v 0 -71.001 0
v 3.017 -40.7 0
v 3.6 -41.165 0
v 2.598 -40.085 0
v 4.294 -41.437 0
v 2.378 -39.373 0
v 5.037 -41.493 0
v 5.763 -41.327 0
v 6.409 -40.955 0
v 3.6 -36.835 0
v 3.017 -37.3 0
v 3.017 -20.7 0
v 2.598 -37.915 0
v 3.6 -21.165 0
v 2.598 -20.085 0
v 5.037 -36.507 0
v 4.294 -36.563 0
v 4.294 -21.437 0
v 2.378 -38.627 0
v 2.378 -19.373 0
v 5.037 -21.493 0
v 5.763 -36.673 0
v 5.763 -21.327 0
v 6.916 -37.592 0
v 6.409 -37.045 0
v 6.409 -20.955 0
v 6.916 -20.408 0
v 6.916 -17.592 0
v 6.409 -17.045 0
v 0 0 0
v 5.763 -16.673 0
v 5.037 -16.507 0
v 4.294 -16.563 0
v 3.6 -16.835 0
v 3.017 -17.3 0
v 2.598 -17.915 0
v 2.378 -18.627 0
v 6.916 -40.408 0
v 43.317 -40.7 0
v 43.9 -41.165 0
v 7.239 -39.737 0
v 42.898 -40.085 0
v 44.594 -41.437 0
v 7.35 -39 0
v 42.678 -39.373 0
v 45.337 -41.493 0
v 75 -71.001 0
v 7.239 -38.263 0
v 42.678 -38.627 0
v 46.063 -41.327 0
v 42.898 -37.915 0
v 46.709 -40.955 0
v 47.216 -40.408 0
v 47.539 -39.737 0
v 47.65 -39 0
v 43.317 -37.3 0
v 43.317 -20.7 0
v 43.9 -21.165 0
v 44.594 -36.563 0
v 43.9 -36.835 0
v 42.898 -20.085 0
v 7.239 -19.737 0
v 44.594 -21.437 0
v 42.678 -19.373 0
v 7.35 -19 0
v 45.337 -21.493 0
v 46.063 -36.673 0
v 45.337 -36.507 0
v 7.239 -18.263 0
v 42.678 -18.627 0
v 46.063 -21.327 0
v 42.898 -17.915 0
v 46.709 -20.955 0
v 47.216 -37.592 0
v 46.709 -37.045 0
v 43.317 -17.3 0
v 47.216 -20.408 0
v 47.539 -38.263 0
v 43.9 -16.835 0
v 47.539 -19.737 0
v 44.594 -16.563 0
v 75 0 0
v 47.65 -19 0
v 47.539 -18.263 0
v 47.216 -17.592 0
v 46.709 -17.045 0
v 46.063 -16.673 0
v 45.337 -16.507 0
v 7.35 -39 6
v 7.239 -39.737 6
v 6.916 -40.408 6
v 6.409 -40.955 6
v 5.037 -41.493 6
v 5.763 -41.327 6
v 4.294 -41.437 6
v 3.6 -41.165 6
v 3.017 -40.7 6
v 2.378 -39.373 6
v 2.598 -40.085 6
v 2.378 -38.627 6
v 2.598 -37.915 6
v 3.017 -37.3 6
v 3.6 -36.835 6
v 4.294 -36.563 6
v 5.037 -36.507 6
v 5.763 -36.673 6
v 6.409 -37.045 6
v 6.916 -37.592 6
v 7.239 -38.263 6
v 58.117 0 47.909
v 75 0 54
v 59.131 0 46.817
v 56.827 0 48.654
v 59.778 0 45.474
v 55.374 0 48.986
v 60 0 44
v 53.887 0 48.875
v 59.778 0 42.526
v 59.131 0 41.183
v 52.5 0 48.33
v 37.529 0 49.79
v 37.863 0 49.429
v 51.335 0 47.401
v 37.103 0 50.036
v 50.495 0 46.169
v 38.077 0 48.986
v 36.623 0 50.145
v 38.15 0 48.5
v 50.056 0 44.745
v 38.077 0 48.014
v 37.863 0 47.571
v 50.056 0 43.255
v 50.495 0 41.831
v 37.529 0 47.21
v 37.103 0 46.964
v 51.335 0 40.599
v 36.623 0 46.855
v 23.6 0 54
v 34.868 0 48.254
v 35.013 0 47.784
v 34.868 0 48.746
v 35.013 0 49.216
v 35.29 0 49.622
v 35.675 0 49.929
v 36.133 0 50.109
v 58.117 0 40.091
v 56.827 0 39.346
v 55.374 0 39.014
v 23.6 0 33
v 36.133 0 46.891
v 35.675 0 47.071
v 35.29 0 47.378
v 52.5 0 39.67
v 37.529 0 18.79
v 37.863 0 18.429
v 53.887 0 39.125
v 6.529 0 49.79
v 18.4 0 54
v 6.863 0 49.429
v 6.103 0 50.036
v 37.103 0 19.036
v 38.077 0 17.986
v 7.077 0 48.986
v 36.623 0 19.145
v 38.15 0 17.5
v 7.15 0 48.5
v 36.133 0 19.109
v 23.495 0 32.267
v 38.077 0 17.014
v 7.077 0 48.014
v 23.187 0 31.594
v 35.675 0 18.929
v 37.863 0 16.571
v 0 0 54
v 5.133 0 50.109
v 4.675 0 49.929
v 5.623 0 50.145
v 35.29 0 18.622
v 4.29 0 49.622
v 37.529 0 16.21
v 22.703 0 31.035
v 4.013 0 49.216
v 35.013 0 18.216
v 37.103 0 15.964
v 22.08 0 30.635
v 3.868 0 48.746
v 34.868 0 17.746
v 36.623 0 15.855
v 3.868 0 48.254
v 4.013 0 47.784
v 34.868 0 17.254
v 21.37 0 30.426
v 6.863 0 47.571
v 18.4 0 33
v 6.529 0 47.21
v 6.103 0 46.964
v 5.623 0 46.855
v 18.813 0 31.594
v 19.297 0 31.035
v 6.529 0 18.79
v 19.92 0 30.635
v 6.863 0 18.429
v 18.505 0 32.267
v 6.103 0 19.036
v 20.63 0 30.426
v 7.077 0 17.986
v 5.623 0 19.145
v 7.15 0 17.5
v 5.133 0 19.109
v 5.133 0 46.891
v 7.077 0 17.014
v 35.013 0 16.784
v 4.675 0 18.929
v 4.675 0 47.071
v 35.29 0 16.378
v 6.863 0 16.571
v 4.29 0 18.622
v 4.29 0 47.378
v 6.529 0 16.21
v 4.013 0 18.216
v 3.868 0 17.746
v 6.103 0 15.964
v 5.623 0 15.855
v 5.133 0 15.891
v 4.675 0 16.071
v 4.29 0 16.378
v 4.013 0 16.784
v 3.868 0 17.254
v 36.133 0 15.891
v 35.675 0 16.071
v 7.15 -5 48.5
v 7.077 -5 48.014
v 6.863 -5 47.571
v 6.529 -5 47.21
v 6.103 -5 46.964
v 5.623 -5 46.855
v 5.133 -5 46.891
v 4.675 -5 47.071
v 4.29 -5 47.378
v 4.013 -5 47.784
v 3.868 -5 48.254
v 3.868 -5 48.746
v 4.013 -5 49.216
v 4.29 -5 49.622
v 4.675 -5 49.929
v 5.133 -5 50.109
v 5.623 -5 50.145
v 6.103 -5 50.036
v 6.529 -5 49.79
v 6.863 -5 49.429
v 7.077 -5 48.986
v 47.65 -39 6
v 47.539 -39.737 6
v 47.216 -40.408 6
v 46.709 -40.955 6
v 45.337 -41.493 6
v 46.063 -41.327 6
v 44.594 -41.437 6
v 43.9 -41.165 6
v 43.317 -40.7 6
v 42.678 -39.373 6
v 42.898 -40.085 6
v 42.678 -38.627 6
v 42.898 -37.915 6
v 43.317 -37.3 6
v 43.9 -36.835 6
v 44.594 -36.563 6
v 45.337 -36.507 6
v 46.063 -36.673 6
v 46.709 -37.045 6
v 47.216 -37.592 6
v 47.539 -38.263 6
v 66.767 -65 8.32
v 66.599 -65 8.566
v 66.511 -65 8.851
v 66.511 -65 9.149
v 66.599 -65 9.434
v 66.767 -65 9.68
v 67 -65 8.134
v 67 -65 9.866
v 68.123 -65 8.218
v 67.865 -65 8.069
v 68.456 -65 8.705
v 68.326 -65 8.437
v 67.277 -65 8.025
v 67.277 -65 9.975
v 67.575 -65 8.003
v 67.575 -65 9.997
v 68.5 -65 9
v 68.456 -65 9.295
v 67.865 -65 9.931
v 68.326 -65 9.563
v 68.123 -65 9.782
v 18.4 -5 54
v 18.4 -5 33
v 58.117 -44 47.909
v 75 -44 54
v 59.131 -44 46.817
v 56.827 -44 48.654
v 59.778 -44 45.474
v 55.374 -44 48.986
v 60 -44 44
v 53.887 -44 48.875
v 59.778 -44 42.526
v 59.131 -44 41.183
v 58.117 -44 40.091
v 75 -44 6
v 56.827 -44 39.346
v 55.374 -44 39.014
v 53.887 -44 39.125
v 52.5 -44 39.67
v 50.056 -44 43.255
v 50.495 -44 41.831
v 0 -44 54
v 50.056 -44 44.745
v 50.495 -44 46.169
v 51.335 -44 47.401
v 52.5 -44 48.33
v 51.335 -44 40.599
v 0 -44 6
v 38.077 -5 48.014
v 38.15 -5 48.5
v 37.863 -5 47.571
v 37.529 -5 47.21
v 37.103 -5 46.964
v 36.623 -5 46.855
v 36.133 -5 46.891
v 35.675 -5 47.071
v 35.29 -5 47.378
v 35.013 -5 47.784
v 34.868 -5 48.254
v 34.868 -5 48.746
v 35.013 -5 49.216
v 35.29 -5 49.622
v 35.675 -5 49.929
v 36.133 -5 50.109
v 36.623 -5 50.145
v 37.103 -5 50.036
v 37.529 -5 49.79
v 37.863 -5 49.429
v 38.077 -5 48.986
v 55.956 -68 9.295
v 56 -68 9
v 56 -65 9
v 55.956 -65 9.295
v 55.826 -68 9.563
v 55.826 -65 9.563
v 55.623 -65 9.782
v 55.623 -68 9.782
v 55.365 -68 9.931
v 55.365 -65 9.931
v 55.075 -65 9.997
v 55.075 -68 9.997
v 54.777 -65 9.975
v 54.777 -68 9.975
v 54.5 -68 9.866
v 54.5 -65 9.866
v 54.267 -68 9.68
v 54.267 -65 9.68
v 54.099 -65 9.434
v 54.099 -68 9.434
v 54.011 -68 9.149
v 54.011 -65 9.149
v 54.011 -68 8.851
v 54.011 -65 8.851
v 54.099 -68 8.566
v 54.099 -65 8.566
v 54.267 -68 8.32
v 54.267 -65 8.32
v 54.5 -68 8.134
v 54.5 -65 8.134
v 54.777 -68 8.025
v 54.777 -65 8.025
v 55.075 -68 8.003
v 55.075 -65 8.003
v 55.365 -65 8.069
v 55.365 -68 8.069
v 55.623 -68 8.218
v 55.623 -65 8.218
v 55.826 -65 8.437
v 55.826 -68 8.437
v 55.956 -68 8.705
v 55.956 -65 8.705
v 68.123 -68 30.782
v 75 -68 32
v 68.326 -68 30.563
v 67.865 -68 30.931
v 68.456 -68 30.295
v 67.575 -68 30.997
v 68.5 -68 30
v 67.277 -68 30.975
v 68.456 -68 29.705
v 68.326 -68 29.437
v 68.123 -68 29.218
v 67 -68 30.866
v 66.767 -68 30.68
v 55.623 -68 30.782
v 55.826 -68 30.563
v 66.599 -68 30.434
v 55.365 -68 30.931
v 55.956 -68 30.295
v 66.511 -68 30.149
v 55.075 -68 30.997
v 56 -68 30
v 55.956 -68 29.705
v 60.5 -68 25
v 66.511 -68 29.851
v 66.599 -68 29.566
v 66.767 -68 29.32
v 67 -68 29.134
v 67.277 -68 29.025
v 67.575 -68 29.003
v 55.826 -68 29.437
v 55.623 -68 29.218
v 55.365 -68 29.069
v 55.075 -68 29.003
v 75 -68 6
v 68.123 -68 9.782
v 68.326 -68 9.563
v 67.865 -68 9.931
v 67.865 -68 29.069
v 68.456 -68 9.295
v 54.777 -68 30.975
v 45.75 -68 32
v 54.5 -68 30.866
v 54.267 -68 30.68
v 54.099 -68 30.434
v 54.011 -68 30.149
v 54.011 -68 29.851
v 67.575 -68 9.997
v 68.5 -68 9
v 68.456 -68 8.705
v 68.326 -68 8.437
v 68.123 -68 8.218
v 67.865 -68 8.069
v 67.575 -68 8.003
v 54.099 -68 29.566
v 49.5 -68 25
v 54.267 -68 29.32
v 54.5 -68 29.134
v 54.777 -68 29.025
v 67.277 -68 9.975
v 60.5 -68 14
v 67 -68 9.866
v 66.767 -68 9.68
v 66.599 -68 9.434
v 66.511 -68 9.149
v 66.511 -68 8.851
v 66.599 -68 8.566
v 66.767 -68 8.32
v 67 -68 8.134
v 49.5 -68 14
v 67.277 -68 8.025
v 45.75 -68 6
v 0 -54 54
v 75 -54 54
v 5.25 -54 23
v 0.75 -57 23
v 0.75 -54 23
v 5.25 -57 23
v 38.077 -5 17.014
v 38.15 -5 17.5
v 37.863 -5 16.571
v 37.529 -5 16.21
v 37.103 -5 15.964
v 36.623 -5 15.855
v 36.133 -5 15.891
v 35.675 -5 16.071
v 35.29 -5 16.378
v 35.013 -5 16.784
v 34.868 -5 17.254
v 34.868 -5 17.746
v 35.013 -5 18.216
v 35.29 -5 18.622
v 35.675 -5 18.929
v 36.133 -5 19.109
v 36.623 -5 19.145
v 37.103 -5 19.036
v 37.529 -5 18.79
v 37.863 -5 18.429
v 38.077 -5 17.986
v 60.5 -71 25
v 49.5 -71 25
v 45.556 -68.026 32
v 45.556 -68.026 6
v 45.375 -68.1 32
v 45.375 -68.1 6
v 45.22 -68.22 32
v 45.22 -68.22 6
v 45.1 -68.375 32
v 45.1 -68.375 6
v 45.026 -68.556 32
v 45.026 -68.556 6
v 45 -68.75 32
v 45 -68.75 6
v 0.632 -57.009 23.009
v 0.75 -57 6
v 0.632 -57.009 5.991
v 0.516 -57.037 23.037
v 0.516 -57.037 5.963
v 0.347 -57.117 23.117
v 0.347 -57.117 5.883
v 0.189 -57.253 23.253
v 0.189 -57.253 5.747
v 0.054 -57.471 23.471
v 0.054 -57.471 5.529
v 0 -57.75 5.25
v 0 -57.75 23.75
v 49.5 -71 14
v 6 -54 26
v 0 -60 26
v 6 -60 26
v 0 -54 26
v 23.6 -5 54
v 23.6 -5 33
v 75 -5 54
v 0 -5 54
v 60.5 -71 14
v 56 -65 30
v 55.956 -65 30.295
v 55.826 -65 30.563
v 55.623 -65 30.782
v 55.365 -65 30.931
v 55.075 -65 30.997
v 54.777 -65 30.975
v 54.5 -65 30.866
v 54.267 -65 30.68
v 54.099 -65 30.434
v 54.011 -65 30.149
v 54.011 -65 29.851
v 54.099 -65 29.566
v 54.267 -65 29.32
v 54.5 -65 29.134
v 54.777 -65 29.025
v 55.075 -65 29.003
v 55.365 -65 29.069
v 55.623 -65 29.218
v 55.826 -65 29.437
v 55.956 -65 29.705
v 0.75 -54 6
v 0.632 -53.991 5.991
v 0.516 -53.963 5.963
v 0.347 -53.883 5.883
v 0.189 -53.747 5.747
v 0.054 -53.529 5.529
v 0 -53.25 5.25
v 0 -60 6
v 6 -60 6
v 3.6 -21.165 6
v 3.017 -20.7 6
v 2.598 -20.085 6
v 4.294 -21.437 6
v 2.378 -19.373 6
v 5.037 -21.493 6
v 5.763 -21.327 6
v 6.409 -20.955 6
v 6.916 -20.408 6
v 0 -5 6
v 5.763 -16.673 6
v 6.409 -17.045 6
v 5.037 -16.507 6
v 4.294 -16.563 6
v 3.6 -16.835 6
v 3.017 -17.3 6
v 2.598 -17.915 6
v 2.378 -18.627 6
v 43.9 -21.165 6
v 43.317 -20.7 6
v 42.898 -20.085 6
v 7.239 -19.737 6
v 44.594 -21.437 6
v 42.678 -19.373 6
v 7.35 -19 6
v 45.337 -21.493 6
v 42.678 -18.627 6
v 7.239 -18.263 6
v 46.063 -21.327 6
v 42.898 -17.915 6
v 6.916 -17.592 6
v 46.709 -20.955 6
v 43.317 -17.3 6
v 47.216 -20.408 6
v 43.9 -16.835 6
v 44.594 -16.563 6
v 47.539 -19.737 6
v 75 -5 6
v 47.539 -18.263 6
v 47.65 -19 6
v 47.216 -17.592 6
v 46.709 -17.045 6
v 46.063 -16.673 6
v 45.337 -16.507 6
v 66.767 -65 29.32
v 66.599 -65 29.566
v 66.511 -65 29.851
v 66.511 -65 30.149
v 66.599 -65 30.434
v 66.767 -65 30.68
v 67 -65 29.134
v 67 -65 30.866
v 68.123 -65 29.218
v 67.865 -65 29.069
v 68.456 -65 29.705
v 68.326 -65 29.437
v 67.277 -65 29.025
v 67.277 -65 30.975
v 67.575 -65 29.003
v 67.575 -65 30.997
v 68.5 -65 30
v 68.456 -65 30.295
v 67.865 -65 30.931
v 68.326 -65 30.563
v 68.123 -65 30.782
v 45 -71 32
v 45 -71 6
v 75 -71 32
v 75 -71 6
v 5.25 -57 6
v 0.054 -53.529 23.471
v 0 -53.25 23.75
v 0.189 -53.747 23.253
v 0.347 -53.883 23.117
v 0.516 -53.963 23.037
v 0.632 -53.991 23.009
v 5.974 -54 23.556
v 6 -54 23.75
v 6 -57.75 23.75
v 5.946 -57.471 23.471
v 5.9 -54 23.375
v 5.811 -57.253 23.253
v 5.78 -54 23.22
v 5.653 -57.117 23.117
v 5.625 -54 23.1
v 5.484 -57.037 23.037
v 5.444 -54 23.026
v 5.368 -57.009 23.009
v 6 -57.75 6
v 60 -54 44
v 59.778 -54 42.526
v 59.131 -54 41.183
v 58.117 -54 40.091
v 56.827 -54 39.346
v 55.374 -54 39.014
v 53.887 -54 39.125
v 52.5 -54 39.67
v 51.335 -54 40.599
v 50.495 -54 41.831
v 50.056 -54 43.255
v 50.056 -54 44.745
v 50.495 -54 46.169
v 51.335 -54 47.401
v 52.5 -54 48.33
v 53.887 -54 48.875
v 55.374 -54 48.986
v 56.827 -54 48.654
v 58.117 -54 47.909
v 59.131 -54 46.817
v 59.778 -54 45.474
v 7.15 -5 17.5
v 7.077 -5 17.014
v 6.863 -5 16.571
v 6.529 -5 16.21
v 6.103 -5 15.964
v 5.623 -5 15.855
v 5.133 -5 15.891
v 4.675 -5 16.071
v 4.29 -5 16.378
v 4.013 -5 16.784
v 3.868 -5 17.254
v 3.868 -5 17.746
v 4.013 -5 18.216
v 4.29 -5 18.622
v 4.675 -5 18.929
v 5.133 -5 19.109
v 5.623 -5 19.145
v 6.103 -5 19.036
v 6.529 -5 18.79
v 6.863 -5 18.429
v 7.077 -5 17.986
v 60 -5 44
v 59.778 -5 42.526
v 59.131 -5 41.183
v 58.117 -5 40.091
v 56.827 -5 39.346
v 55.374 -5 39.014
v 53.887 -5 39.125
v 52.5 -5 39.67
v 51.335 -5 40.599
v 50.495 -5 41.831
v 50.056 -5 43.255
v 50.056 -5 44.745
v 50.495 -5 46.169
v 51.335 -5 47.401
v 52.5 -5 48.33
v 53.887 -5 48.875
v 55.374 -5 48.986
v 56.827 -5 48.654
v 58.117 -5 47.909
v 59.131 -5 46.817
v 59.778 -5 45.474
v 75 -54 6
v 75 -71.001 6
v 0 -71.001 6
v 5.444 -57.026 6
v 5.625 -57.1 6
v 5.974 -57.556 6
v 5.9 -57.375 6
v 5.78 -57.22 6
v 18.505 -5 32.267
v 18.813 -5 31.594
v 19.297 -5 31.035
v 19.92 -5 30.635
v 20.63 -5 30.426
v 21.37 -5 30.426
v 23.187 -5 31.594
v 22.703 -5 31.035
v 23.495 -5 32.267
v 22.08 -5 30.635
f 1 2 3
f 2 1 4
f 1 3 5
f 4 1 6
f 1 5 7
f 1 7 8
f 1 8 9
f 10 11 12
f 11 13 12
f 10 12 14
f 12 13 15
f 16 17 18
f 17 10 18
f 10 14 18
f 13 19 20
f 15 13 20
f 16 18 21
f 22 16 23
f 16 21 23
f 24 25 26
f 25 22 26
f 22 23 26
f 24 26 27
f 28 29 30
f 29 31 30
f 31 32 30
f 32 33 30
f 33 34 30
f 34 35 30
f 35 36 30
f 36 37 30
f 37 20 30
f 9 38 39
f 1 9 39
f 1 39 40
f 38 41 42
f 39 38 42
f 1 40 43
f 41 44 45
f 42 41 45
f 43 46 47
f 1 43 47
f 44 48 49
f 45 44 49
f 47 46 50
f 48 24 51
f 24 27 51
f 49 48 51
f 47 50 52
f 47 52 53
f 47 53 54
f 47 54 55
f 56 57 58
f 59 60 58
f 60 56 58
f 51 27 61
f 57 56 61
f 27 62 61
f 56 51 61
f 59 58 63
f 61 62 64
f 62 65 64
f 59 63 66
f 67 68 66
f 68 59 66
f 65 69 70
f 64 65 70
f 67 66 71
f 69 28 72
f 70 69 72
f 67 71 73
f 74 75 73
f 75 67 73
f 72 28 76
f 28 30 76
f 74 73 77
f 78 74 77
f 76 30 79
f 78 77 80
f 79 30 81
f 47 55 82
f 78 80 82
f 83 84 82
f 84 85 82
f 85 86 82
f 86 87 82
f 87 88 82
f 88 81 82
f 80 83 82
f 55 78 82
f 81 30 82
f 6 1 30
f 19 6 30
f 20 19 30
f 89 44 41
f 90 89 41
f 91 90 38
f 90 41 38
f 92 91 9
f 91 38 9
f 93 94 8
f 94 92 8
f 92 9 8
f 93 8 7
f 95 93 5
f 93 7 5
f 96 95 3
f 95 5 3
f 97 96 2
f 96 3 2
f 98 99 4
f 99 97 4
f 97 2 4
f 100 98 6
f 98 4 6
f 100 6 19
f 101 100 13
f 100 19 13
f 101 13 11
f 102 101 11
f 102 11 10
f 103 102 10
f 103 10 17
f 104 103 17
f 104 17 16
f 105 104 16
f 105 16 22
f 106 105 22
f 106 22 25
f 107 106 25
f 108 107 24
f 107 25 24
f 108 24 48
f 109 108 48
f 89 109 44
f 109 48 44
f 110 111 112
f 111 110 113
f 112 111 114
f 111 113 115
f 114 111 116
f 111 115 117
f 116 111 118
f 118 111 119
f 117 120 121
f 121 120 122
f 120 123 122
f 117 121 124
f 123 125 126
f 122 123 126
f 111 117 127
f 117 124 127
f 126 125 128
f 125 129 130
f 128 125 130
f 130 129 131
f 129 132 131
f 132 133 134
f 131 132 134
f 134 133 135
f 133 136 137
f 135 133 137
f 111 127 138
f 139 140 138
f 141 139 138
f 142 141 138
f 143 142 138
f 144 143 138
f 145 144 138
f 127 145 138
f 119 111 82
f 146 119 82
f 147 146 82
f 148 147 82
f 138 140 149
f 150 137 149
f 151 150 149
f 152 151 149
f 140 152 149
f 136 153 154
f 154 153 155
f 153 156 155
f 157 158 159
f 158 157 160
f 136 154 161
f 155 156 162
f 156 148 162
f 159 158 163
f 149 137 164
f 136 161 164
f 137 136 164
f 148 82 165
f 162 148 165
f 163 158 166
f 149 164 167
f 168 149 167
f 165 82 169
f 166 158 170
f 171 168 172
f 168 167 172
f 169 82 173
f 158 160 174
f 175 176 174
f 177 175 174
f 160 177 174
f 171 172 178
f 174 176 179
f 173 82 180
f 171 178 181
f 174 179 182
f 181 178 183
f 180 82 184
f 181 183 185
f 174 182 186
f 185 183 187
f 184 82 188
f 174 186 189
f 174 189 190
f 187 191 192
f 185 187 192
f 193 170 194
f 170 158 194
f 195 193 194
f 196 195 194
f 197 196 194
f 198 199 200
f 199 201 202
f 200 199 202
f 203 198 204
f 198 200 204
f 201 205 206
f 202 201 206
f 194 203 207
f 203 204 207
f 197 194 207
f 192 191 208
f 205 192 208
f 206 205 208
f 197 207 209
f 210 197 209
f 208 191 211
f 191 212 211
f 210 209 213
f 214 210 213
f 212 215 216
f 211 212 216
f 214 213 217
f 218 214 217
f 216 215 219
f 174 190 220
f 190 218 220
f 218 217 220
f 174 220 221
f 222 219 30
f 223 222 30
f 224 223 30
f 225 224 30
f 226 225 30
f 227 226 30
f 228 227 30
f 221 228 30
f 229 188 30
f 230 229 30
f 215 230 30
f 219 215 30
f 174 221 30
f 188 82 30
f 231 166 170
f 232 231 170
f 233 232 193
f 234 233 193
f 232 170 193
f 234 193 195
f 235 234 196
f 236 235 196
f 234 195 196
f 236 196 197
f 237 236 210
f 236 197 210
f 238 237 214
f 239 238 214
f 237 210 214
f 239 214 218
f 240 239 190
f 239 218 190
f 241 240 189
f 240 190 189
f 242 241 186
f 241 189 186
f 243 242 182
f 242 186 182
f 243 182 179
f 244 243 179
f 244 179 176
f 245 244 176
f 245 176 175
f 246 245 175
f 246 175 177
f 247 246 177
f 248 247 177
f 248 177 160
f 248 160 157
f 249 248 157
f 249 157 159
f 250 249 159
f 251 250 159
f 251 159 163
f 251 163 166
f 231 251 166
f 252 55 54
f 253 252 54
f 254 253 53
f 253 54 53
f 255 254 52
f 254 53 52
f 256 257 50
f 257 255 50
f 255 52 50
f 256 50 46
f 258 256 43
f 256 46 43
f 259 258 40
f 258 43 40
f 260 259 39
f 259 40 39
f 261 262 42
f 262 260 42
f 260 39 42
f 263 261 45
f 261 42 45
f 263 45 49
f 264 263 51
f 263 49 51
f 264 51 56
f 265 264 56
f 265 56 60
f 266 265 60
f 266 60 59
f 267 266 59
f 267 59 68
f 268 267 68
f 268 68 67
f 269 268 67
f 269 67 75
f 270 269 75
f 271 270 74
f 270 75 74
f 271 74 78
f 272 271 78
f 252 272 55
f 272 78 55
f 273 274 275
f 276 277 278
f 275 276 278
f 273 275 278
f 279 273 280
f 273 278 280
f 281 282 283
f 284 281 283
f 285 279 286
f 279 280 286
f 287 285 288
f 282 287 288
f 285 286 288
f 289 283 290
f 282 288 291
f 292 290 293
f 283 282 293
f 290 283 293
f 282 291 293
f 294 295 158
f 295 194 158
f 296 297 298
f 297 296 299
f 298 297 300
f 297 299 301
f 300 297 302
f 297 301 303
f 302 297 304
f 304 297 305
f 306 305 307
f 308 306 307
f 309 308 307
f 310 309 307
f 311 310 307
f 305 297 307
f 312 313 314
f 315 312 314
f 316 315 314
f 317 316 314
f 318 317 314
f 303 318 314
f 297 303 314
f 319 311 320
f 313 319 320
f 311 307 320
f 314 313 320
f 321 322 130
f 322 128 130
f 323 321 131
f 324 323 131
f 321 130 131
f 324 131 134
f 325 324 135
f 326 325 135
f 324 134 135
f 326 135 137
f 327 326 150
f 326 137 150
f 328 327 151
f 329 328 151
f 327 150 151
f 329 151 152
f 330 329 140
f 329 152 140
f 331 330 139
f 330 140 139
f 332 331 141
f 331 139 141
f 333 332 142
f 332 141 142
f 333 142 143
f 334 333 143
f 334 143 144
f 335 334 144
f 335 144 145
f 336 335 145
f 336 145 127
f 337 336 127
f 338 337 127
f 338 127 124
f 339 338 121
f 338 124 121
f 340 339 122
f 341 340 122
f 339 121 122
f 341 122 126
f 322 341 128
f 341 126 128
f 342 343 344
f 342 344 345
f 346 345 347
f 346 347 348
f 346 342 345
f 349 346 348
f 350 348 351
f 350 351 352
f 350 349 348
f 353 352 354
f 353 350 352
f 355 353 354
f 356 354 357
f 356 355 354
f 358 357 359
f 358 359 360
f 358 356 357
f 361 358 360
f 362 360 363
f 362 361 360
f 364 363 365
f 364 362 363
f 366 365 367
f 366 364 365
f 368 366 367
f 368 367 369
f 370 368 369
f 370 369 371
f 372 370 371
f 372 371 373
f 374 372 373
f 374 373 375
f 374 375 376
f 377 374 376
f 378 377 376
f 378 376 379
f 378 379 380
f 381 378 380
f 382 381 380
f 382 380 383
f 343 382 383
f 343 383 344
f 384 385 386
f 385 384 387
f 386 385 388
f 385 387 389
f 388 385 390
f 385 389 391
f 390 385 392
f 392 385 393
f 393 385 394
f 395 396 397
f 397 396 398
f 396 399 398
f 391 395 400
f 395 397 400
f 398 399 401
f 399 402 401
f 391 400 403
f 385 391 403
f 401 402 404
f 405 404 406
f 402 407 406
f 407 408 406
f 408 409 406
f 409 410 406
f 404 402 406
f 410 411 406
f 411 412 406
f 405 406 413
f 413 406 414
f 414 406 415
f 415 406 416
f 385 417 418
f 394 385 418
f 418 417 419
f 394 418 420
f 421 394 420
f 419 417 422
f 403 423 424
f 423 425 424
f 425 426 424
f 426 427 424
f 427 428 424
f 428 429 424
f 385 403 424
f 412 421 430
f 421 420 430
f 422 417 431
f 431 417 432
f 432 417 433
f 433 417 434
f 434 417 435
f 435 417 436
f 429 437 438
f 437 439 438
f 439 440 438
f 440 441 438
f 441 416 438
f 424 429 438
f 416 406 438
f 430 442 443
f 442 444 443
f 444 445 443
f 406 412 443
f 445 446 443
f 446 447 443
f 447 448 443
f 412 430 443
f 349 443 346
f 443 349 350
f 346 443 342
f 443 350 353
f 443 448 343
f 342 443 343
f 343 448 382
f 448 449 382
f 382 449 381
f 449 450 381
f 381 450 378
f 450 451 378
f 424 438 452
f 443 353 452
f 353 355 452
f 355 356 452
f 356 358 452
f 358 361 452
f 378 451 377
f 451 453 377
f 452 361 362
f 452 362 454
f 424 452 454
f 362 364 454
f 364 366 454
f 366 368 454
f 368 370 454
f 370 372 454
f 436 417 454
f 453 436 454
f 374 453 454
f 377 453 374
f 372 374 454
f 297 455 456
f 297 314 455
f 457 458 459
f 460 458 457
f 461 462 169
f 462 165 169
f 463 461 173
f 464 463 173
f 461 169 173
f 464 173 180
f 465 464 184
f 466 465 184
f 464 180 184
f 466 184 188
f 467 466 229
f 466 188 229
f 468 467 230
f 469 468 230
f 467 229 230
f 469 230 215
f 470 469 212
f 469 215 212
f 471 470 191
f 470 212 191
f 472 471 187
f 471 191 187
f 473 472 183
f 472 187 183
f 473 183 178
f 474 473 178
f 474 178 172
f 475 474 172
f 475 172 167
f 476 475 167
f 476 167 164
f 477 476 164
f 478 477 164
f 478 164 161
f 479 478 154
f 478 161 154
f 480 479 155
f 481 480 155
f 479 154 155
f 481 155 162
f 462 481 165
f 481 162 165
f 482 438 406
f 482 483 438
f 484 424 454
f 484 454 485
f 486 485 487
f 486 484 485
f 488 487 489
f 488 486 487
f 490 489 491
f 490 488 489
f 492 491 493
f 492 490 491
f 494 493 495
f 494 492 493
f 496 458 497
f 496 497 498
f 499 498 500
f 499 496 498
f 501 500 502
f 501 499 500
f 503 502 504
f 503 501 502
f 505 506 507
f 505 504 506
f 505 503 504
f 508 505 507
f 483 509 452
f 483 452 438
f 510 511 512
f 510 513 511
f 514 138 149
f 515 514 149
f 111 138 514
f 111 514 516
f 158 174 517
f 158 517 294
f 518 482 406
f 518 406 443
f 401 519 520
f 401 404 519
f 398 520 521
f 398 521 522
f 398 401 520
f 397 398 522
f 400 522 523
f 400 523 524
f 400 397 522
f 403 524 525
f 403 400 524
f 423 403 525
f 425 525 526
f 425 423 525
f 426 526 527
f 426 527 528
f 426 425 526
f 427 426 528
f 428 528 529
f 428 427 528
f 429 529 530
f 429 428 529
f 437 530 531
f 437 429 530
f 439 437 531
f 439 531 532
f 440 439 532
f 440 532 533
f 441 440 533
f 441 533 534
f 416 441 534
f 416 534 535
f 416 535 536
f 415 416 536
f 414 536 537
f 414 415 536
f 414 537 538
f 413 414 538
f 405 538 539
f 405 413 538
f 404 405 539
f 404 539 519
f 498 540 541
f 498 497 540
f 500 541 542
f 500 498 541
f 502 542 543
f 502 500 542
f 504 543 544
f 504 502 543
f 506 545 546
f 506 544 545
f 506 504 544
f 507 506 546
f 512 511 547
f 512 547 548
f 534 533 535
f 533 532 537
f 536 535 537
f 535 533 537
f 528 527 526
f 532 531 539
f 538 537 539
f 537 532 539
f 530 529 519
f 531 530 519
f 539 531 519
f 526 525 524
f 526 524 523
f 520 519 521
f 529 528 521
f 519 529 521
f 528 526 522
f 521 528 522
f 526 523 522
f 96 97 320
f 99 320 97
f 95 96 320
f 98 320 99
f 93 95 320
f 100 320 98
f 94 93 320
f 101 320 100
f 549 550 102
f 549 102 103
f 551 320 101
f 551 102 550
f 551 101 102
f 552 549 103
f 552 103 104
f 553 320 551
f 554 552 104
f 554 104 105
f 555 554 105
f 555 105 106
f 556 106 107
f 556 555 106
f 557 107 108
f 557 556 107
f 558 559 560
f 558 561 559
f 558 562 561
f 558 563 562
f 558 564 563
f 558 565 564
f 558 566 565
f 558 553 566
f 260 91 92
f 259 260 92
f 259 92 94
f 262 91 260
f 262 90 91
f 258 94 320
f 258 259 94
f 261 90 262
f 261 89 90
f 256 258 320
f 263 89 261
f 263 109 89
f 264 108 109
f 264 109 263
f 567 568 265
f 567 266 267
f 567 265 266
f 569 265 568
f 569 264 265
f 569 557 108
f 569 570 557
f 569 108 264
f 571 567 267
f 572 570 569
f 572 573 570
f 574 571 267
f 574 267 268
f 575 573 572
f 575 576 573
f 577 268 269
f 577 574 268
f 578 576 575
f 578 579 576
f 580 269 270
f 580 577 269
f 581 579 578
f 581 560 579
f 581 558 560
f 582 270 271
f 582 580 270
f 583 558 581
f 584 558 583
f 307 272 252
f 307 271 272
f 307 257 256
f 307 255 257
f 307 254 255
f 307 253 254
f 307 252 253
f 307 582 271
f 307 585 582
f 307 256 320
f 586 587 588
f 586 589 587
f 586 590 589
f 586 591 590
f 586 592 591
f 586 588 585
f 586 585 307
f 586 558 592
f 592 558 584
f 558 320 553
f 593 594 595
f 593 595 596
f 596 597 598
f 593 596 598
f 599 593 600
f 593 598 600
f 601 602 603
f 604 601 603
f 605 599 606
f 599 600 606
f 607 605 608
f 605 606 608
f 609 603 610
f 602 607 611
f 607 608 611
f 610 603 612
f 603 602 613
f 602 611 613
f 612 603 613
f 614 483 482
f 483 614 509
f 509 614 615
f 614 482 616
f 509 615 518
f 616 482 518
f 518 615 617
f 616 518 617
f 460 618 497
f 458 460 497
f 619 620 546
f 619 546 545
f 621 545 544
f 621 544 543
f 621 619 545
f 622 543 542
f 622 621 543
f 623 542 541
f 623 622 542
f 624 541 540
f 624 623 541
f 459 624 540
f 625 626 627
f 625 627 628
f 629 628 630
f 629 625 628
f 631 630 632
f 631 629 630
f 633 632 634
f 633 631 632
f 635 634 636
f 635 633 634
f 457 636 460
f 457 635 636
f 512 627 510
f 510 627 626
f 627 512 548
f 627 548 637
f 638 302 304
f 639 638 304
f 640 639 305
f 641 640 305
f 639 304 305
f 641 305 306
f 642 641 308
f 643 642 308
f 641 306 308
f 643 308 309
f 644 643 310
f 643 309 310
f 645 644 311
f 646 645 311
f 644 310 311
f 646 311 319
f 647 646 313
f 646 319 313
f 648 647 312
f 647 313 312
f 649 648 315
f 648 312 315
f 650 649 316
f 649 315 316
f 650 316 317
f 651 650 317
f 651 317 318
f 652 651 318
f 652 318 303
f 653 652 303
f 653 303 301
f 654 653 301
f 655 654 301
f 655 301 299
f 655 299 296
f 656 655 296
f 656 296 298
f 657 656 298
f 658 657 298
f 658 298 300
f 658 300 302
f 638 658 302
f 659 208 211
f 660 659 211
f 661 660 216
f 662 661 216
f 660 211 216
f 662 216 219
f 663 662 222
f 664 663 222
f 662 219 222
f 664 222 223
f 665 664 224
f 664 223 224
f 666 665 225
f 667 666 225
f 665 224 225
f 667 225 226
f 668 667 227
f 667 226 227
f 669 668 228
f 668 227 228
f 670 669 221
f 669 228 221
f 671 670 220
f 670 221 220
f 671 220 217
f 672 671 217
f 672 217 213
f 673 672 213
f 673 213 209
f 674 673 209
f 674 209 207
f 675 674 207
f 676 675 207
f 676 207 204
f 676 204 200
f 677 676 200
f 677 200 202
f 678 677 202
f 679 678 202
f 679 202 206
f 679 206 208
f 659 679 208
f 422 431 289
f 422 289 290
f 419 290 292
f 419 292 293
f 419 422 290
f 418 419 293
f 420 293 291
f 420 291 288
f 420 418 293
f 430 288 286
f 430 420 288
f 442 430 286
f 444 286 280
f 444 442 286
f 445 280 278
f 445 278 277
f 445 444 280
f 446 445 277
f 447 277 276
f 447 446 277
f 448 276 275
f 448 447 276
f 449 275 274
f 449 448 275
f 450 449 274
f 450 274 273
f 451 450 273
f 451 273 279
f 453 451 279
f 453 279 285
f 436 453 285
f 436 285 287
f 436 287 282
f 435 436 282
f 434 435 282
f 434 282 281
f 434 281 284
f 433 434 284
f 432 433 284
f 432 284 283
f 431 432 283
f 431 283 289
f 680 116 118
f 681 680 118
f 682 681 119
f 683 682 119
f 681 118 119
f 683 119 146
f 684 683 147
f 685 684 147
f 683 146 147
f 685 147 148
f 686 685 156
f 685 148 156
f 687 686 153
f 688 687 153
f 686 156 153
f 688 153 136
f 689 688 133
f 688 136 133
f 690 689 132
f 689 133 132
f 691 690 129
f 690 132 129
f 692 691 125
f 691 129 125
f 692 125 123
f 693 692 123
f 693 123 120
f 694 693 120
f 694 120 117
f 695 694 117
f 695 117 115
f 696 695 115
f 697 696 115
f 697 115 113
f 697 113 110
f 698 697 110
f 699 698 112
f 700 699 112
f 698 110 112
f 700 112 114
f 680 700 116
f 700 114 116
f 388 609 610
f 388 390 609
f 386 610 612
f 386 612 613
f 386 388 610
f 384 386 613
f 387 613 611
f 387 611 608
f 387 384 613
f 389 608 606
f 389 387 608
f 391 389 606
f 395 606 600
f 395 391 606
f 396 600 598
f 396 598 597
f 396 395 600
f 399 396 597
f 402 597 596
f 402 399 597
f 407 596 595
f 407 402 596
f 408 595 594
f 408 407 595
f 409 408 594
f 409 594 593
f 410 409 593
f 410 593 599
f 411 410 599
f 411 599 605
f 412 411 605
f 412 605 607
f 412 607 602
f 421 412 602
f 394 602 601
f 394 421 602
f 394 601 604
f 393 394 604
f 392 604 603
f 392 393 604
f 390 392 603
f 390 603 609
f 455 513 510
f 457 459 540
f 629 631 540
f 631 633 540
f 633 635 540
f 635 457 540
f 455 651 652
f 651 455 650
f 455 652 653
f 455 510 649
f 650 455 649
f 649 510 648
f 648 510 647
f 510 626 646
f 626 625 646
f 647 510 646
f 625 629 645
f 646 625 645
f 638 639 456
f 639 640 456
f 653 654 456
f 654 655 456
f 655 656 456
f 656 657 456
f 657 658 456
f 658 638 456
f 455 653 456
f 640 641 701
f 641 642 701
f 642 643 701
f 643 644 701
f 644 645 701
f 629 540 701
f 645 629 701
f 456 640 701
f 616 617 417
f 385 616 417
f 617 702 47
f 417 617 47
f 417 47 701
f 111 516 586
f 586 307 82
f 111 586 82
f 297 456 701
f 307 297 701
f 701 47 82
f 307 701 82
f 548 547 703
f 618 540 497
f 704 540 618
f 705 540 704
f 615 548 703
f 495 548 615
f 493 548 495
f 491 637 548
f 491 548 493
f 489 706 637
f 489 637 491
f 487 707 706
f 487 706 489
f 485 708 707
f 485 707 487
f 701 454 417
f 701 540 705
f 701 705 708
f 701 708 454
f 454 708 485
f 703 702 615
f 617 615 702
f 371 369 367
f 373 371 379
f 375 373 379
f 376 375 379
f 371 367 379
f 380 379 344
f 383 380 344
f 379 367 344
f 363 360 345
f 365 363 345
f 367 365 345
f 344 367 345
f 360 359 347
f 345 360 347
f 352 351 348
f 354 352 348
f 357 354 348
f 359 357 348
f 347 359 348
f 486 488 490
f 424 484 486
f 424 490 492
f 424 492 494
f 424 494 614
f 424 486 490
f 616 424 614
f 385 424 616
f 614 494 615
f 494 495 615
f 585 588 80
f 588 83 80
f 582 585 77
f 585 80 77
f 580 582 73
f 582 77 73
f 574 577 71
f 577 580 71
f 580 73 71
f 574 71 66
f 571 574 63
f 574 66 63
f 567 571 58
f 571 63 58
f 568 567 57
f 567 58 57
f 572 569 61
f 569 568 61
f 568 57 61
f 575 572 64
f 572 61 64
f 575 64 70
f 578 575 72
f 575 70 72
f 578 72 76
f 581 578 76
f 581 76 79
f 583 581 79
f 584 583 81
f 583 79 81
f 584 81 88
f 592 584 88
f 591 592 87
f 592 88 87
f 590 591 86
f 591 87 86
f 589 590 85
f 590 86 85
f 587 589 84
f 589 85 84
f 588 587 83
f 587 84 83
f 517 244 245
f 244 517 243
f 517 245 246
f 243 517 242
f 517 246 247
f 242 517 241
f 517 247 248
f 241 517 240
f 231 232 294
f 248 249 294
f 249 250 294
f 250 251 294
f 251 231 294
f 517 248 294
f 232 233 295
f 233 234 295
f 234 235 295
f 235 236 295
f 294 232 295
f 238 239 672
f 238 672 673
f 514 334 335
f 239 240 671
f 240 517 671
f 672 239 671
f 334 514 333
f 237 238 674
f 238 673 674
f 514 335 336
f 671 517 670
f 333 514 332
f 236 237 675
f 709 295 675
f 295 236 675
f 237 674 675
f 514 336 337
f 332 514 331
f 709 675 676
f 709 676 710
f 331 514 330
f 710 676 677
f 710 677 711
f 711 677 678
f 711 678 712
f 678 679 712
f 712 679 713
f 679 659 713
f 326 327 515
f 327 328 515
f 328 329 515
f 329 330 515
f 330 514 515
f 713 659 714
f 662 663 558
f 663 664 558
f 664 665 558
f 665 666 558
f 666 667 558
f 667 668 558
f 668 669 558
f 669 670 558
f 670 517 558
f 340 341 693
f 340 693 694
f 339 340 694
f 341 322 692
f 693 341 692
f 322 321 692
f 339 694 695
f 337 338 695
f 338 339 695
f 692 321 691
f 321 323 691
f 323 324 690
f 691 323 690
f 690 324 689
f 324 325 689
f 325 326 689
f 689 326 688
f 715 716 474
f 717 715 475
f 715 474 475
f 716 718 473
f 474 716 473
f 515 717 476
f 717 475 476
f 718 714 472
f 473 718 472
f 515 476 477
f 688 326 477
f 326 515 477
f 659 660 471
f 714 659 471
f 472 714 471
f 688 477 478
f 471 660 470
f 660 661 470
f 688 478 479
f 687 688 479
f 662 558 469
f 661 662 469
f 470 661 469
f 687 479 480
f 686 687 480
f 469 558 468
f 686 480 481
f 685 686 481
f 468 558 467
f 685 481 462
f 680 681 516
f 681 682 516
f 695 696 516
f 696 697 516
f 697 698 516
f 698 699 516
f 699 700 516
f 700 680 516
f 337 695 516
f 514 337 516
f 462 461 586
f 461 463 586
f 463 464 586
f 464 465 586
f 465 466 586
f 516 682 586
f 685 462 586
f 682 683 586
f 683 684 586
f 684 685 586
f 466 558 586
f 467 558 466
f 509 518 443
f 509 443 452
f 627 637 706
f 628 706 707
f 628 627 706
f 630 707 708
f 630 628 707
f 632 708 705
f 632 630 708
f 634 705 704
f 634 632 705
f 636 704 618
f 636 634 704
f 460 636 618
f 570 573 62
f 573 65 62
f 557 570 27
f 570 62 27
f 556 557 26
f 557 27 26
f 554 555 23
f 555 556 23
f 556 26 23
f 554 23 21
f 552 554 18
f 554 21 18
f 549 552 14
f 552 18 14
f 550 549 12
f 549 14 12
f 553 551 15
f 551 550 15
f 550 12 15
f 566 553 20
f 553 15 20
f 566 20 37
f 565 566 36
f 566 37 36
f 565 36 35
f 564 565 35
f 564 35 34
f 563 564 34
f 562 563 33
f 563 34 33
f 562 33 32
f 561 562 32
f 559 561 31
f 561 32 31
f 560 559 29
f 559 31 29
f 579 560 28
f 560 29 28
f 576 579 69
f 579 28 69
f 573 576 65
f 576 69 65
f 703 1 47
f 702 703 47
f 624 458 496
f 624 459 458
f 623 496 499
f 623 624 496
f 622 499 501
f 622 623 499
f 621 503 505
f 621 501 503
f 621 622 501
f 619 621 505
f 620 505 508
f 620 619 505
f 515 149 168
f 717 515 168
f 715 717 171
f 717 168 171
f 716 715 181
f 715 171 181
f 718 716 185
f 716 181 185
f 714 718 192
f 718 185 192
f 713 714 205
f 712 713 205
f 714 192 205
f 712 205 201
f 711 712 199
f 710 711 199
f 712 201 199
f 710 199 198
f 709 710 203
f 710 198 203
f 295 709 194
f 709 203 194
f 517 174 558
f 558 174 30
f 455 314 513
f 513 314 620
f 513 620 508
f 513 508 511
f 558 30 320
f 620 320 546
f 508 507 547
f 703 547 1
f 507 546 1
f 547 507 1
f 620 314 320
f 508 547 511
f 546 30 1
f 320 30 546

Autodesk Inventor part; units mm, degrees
ref_plane "YZ Plane" through (0, 0, 0) normal (1, 0, 0) x (0, 1, 0)
ref_plane "XZ Plane" through (0, 0, 0) normal (0, 1, 0) x (-1, 0, 0)
ref_plane "XY Plane" through (0, 0, 0) normal (0, 0, 1) x (1, 0, 0)
sketch "Sketch1" plane through (0, 0, 0) normal (0, 0, 1) x (1, 0, 0)
  line L0 (0, 0) -> (75, 0)
  line L1 (75, 0) -> (75, -71.001)
  line L2 (75, -71.001) -> (0, -71.001)
  line L3 (0, -71.001) -> (0, 0)
  circle A0 centre (15, -29) radius 2.5
  circle A1 centre (25, -29) radius 2.5
  circle A2 centre (35, -29) radius 2.5
  circle A3 centre (25, -19) radius 2.5
  circle A4 centre (25, -39) radius 2.5
  circle A5 centre (4.85, -29) radius 2.5
  circle A6 centre (4.85, -39) radius 2.5
  circle A7 centre (4.85, -19) radius 2.5
  circle A8 centre (45.15, -19) radius 2.5
  circle A9 centre (45.15, -39) radius 2.5
  line L4 (0, 0) -> (50, 0)
  line L5 (50, 0) -> (50, -5)
  line L6 (0, -5) -> (0, 0)
  line L7 (0, -5) -> (75, -5)
  line L8 (0, -44) -> (75, -44)
  line L9 (0, -54) -> (75, -54)
  line L10 (0, -68) -> (75, -68)
  line L11 (0, -71) -> (75, -71)
  line L12 (45, -68) -> (45, -71)
  line L13 (6, -54) -> (6, -68)
  line L14 (0, -57) -> (6, -57)
  line L15 (0, -60) -> (6, -60)
  point P0 (37.5, 0)
  dimension "d0" = 75
  dimension "d1" = 71.001
  dimension "d3" = 5
  dimension "d4" = 10
  dimension "d6" = 10
  dimension "d8" = 10
  dimension "d10" = 10
  dimension "d12" = 20.15
  dimension "d15" = 20.15
  dimension "d23" = 5
  dimension "d29" = 39
  dimension "d30" = 15
  dimension "d31" = 10
  dimension "d44" = 14
  dimension "d45" = 3
  dimension "d46" = 25
  dimension "d52" = 30
  dimension "d69" = 6
  dimension "d71" = 3
  dimension "d72" = 3
sketch "Sketch1 outline for Extrusion1" plane through (0, 0, 0) normal (0, 0, 1) x (1, 0, 0)
  line L0 (75, 0) -> (0, 0)
  line L1 (0, 0) -> (0, -71.001)
  line L2 (0, -71.001) -> (75, -71.001)
  line L3 (75, -71.001) -> (75, 0)
  circle A0 centre (45.15, -19) radius 2.5
  circle A1 centre (4.85, -39) radius 2.5
  circle A2 centre (45.15, -39) radius 2.5
  circle A3 centre (4.85, -19) radius 2.5
extrude "Extrusion1" add sketch "Sketch1 outline for Extrusion1" along normal blind 6
sketch "Sketch1 outline for Extrusion3" plane through (0, 0, 0) normal (0, 0, 1) x (1, 0, 0)
  line L0 (75, 0) -> (0, 0)
  line L1 (75, -5) -> (75, 0)
  line L2 (0, -5) -> (75, -5)
  line L3 (0, 0) -> (0, -5)
  line L4 (75, -44) -> (0, -44)
  line L5 (75, -54) -> (75, -44)
  line L6 (0, -54) -> (75, -54)
  line L7 (0, -44) -> (0, -54)
extrude "Extrusion3" add sketch "Sketch1 outline for Extrusion3" along normal blind 54
sketch "Sketch3" plane through (0, 0, 0) normal (0, 1, 0) x (1, 0, 0)
  line L0 (0, -54) -> (75, -54) projected
  line L1 (0, 0) -> (75, 0)
  line L2 (75, 0) -> (75, -54)
  line L3 (75, -54) -> (0, -54)
  line L4 (0, -54) -> (0, 0)
  circle A0 centre (5.5, -48.5) radius 1.65
  circle A1 centre (36.5, -48.5) radius 1.65
  circle A2 centre (5.5, -17.5) radius 1.65
  circle A3 centre (36.5, -17.5) radius 1.65
  line L5 (21, -33) -> (21, -54) construction
  line L6 (18.4, -33) -> (18.4, -54)
  line L7 (23.6, -54) -> (23.6, -33)
  arc A4 (23.6, -33) -> (18.4, -33) centre (21, -33) ccw
  arc A5 (18.4, -54) -> (23.6, -54) centre (21, -54) ccw
  circle A6 centre (55, -44) radius 5
  point P0 (21, -43.5)
  dimension "d34" = 3.3
  dimension "d35" = 31
  dimension "d36" = 31
  dimension "d37" = 5.2
  dimension "d38" = 15.5
  dimension "d39" = 15.5
  dimension "d40" = 21
  dimension "d41" = 21
  dimension "d47" = 10
  dimension "d48" = 10
  dimension "d49" = 20
sketch "Sketch3 outline for Extrusion5" plane through (0, 0, 0) normal (0, 1, 0) x (1, 0, 0)
  arc A0 (23.6, -33) -> (18.4, -33) centre (21, -33) ccw
  line L0 (23.6, -54) -> (23.6, -33)
  arc A1 (18.4, -54) -> (23.6, -54) centre (21, -54) ccw
  line L1 (18.4, -33) -> (18.4, -54)
  circle A2 centre (5.5, -48.5) radius 1.65
  circle A3 centre (36.5, -48.5) radius 1.65
  circle A4 centre (5.5, -17.5) radius 1.65
  circle A5 centre (36.5, -17.5) radius 1.65
extrude "Extrusion5" cut sketch "Sketch3 outline for Extrusion5" against normal blind 5
sketch "Sketch3 outline for Extrusion6" plane through (0, 0, 0) normal (0, 1, 0) x (1, 0, 0)
  circle A0 centre (55, -44) radius 5
extrude "Extrusion6" cut sketch "Sketch3 outline for Extrusion6" against normal blind 54
sketch "Sketch1 outline for Extrusion7" plane through (0, 0, 0) normal (0, 0, 1) x (1, 0, 0)
  line L0 (75, -71) -> (75, -68)
  line L1 (45, -71) -> (75, -71)
  line L2 (45, -68) -> (45, -71)
  line L3 (75, -68) -> (45, -68)
extrude "Extrusion7" add sketch "Sketch1 outline for Extrusion7" along normal blind 32
sketch "Sketch4" plane through (45, -71, 6) normal (0, -1, 0) x (1, 0, 0)
  line L0 (0, 0) -> (30, 0) projected
  line L1 (0, 26) -> (30, 26) projected
  line L2 (0, 0) -> (30, 0)
  line L3 (30, 0) -> (30, 26)
  line L4 (30, 26) -> (0, 26)
  line L5 (0, 26) -> (0, 0)
  circle A0 centre (22.5, 24) radius 1
  circle A1 centre (22.5, 3) radius 1
  circle A2 centre (10, 3) radius 1
  circle A3 centre (10, 24) radius 1
  line L6 (0, 0) -> (0, 26) projected
  line L7 (15.5, 8) -> (4.5, 8)
  line L8 (4.5, 8) -> (4.5, 19)
  line L9 (4.5, 19) -> (15.5, 19)
  line L10 (15.5, 19) -> (15.5, 8)
  line L11 (15.5, 8) -> (4.5, 19) construction
  line L12 (4.5, 8) -> (15.5, 19) construction
  point P0 (-45, -6)
  point P1 (10, 13.5)
  point P2 (10, 13.5)
  point P3 (10, 13.5)
  dimension "d55" = 2
  dimension "d58" = 12.5
  dimension "d59" = 21
  dimension "d60" = 2
  dimension "d61" = 11
  dimension "d62" = 11
  dimension "d63" = 10.5
  dimension "d68" = 20
sketch "Sketch4 outline for Extrusion8" plane through (45, -71, 6) normal (0, -1, 0) x (1, 0, 0)
  line L0 (15.5, 8) -> (4.5, 8)
  line L1 (4.5, 8) -> (4.5, 19)
  line L2 (4.5, 19) -> (15.5, 19)
  line L3 (15.5, 19) -> (15.5, 8)
extrude "Extrusion8" cut sketch "Sketch4 outline for Extrusion8" against normal blind 3
sketch "Sketch4 outline for Extrusion9" plane through (45, -71, 6) normal (0, -1, 0) x (1, 0, 0)
  circle A0 centre (22.5, 24) radius 1
  circle A1 centre (22.5, 3) radius 1
  circle A2 centre (10, 3) radius 1
  circle A3 centre (10, 24) radius 1
extrude "Extrusion9" add sketch "Sketch4 outline for Extrusion9" against normal blind 6
sketch "Sketch1 outline for Extrusion10" plane through (0, 0, 0) normal (0, 0, 1) x (1, 0, 0)
  line L0 (6, -57) -> (0, -57)
  line L1 (6, -60) -> (6, -57)
  line L2 (0, -60) -> (6, -60)
  line L3 (0, -57) -> (0, -60)
extrude "Extrusion10" add sketch "Sketch1 outline for Extrusion10" along normal blind 26
sketch "Sketch5" plane through (0, -60, 6) normal (0, -1, 0) x (1, 0, 0)
  line L0 (6, 20) -> (0, 20)
  line L1 (0, -1.548307) -> (6, -1.548307)
  line L2 (6, -1.548307) -> (6, 20)
  line L3 (6, 20) -> (0, 20)
  line L4 (0, 20) -> (0, -1.548307)
  line L5 (0, 17) -> (6, 17)
  point P0 (0, -6)
  dimension "d75" = 3
sketch "Sketch5 outline for Extrusion11" plane through (0, -60, 6) normal (0, -1, 0) x (1, 0, 0)
  line L0 (6, 17) -> (6, 20)
  line L1 (0, 17) -> (6, 17)
  line L2 (0, 20) -> (0, 17)
  line L3 (6, 20) -> (0, 20)
extrude "Extrusion11" add sketch "Sketch5 outline for Extrusion11" against normal blind 6
fillet "Fillet1" radius 0.75 7 edges at (6, -57, 14.5) (0, -57, 14.5) (0, -54, 14.5) (0, -55.5, 23) (0, -55.5, 6) (6, -55.5, 23) (45, -68, 19)
properties part number "pnp-head"
